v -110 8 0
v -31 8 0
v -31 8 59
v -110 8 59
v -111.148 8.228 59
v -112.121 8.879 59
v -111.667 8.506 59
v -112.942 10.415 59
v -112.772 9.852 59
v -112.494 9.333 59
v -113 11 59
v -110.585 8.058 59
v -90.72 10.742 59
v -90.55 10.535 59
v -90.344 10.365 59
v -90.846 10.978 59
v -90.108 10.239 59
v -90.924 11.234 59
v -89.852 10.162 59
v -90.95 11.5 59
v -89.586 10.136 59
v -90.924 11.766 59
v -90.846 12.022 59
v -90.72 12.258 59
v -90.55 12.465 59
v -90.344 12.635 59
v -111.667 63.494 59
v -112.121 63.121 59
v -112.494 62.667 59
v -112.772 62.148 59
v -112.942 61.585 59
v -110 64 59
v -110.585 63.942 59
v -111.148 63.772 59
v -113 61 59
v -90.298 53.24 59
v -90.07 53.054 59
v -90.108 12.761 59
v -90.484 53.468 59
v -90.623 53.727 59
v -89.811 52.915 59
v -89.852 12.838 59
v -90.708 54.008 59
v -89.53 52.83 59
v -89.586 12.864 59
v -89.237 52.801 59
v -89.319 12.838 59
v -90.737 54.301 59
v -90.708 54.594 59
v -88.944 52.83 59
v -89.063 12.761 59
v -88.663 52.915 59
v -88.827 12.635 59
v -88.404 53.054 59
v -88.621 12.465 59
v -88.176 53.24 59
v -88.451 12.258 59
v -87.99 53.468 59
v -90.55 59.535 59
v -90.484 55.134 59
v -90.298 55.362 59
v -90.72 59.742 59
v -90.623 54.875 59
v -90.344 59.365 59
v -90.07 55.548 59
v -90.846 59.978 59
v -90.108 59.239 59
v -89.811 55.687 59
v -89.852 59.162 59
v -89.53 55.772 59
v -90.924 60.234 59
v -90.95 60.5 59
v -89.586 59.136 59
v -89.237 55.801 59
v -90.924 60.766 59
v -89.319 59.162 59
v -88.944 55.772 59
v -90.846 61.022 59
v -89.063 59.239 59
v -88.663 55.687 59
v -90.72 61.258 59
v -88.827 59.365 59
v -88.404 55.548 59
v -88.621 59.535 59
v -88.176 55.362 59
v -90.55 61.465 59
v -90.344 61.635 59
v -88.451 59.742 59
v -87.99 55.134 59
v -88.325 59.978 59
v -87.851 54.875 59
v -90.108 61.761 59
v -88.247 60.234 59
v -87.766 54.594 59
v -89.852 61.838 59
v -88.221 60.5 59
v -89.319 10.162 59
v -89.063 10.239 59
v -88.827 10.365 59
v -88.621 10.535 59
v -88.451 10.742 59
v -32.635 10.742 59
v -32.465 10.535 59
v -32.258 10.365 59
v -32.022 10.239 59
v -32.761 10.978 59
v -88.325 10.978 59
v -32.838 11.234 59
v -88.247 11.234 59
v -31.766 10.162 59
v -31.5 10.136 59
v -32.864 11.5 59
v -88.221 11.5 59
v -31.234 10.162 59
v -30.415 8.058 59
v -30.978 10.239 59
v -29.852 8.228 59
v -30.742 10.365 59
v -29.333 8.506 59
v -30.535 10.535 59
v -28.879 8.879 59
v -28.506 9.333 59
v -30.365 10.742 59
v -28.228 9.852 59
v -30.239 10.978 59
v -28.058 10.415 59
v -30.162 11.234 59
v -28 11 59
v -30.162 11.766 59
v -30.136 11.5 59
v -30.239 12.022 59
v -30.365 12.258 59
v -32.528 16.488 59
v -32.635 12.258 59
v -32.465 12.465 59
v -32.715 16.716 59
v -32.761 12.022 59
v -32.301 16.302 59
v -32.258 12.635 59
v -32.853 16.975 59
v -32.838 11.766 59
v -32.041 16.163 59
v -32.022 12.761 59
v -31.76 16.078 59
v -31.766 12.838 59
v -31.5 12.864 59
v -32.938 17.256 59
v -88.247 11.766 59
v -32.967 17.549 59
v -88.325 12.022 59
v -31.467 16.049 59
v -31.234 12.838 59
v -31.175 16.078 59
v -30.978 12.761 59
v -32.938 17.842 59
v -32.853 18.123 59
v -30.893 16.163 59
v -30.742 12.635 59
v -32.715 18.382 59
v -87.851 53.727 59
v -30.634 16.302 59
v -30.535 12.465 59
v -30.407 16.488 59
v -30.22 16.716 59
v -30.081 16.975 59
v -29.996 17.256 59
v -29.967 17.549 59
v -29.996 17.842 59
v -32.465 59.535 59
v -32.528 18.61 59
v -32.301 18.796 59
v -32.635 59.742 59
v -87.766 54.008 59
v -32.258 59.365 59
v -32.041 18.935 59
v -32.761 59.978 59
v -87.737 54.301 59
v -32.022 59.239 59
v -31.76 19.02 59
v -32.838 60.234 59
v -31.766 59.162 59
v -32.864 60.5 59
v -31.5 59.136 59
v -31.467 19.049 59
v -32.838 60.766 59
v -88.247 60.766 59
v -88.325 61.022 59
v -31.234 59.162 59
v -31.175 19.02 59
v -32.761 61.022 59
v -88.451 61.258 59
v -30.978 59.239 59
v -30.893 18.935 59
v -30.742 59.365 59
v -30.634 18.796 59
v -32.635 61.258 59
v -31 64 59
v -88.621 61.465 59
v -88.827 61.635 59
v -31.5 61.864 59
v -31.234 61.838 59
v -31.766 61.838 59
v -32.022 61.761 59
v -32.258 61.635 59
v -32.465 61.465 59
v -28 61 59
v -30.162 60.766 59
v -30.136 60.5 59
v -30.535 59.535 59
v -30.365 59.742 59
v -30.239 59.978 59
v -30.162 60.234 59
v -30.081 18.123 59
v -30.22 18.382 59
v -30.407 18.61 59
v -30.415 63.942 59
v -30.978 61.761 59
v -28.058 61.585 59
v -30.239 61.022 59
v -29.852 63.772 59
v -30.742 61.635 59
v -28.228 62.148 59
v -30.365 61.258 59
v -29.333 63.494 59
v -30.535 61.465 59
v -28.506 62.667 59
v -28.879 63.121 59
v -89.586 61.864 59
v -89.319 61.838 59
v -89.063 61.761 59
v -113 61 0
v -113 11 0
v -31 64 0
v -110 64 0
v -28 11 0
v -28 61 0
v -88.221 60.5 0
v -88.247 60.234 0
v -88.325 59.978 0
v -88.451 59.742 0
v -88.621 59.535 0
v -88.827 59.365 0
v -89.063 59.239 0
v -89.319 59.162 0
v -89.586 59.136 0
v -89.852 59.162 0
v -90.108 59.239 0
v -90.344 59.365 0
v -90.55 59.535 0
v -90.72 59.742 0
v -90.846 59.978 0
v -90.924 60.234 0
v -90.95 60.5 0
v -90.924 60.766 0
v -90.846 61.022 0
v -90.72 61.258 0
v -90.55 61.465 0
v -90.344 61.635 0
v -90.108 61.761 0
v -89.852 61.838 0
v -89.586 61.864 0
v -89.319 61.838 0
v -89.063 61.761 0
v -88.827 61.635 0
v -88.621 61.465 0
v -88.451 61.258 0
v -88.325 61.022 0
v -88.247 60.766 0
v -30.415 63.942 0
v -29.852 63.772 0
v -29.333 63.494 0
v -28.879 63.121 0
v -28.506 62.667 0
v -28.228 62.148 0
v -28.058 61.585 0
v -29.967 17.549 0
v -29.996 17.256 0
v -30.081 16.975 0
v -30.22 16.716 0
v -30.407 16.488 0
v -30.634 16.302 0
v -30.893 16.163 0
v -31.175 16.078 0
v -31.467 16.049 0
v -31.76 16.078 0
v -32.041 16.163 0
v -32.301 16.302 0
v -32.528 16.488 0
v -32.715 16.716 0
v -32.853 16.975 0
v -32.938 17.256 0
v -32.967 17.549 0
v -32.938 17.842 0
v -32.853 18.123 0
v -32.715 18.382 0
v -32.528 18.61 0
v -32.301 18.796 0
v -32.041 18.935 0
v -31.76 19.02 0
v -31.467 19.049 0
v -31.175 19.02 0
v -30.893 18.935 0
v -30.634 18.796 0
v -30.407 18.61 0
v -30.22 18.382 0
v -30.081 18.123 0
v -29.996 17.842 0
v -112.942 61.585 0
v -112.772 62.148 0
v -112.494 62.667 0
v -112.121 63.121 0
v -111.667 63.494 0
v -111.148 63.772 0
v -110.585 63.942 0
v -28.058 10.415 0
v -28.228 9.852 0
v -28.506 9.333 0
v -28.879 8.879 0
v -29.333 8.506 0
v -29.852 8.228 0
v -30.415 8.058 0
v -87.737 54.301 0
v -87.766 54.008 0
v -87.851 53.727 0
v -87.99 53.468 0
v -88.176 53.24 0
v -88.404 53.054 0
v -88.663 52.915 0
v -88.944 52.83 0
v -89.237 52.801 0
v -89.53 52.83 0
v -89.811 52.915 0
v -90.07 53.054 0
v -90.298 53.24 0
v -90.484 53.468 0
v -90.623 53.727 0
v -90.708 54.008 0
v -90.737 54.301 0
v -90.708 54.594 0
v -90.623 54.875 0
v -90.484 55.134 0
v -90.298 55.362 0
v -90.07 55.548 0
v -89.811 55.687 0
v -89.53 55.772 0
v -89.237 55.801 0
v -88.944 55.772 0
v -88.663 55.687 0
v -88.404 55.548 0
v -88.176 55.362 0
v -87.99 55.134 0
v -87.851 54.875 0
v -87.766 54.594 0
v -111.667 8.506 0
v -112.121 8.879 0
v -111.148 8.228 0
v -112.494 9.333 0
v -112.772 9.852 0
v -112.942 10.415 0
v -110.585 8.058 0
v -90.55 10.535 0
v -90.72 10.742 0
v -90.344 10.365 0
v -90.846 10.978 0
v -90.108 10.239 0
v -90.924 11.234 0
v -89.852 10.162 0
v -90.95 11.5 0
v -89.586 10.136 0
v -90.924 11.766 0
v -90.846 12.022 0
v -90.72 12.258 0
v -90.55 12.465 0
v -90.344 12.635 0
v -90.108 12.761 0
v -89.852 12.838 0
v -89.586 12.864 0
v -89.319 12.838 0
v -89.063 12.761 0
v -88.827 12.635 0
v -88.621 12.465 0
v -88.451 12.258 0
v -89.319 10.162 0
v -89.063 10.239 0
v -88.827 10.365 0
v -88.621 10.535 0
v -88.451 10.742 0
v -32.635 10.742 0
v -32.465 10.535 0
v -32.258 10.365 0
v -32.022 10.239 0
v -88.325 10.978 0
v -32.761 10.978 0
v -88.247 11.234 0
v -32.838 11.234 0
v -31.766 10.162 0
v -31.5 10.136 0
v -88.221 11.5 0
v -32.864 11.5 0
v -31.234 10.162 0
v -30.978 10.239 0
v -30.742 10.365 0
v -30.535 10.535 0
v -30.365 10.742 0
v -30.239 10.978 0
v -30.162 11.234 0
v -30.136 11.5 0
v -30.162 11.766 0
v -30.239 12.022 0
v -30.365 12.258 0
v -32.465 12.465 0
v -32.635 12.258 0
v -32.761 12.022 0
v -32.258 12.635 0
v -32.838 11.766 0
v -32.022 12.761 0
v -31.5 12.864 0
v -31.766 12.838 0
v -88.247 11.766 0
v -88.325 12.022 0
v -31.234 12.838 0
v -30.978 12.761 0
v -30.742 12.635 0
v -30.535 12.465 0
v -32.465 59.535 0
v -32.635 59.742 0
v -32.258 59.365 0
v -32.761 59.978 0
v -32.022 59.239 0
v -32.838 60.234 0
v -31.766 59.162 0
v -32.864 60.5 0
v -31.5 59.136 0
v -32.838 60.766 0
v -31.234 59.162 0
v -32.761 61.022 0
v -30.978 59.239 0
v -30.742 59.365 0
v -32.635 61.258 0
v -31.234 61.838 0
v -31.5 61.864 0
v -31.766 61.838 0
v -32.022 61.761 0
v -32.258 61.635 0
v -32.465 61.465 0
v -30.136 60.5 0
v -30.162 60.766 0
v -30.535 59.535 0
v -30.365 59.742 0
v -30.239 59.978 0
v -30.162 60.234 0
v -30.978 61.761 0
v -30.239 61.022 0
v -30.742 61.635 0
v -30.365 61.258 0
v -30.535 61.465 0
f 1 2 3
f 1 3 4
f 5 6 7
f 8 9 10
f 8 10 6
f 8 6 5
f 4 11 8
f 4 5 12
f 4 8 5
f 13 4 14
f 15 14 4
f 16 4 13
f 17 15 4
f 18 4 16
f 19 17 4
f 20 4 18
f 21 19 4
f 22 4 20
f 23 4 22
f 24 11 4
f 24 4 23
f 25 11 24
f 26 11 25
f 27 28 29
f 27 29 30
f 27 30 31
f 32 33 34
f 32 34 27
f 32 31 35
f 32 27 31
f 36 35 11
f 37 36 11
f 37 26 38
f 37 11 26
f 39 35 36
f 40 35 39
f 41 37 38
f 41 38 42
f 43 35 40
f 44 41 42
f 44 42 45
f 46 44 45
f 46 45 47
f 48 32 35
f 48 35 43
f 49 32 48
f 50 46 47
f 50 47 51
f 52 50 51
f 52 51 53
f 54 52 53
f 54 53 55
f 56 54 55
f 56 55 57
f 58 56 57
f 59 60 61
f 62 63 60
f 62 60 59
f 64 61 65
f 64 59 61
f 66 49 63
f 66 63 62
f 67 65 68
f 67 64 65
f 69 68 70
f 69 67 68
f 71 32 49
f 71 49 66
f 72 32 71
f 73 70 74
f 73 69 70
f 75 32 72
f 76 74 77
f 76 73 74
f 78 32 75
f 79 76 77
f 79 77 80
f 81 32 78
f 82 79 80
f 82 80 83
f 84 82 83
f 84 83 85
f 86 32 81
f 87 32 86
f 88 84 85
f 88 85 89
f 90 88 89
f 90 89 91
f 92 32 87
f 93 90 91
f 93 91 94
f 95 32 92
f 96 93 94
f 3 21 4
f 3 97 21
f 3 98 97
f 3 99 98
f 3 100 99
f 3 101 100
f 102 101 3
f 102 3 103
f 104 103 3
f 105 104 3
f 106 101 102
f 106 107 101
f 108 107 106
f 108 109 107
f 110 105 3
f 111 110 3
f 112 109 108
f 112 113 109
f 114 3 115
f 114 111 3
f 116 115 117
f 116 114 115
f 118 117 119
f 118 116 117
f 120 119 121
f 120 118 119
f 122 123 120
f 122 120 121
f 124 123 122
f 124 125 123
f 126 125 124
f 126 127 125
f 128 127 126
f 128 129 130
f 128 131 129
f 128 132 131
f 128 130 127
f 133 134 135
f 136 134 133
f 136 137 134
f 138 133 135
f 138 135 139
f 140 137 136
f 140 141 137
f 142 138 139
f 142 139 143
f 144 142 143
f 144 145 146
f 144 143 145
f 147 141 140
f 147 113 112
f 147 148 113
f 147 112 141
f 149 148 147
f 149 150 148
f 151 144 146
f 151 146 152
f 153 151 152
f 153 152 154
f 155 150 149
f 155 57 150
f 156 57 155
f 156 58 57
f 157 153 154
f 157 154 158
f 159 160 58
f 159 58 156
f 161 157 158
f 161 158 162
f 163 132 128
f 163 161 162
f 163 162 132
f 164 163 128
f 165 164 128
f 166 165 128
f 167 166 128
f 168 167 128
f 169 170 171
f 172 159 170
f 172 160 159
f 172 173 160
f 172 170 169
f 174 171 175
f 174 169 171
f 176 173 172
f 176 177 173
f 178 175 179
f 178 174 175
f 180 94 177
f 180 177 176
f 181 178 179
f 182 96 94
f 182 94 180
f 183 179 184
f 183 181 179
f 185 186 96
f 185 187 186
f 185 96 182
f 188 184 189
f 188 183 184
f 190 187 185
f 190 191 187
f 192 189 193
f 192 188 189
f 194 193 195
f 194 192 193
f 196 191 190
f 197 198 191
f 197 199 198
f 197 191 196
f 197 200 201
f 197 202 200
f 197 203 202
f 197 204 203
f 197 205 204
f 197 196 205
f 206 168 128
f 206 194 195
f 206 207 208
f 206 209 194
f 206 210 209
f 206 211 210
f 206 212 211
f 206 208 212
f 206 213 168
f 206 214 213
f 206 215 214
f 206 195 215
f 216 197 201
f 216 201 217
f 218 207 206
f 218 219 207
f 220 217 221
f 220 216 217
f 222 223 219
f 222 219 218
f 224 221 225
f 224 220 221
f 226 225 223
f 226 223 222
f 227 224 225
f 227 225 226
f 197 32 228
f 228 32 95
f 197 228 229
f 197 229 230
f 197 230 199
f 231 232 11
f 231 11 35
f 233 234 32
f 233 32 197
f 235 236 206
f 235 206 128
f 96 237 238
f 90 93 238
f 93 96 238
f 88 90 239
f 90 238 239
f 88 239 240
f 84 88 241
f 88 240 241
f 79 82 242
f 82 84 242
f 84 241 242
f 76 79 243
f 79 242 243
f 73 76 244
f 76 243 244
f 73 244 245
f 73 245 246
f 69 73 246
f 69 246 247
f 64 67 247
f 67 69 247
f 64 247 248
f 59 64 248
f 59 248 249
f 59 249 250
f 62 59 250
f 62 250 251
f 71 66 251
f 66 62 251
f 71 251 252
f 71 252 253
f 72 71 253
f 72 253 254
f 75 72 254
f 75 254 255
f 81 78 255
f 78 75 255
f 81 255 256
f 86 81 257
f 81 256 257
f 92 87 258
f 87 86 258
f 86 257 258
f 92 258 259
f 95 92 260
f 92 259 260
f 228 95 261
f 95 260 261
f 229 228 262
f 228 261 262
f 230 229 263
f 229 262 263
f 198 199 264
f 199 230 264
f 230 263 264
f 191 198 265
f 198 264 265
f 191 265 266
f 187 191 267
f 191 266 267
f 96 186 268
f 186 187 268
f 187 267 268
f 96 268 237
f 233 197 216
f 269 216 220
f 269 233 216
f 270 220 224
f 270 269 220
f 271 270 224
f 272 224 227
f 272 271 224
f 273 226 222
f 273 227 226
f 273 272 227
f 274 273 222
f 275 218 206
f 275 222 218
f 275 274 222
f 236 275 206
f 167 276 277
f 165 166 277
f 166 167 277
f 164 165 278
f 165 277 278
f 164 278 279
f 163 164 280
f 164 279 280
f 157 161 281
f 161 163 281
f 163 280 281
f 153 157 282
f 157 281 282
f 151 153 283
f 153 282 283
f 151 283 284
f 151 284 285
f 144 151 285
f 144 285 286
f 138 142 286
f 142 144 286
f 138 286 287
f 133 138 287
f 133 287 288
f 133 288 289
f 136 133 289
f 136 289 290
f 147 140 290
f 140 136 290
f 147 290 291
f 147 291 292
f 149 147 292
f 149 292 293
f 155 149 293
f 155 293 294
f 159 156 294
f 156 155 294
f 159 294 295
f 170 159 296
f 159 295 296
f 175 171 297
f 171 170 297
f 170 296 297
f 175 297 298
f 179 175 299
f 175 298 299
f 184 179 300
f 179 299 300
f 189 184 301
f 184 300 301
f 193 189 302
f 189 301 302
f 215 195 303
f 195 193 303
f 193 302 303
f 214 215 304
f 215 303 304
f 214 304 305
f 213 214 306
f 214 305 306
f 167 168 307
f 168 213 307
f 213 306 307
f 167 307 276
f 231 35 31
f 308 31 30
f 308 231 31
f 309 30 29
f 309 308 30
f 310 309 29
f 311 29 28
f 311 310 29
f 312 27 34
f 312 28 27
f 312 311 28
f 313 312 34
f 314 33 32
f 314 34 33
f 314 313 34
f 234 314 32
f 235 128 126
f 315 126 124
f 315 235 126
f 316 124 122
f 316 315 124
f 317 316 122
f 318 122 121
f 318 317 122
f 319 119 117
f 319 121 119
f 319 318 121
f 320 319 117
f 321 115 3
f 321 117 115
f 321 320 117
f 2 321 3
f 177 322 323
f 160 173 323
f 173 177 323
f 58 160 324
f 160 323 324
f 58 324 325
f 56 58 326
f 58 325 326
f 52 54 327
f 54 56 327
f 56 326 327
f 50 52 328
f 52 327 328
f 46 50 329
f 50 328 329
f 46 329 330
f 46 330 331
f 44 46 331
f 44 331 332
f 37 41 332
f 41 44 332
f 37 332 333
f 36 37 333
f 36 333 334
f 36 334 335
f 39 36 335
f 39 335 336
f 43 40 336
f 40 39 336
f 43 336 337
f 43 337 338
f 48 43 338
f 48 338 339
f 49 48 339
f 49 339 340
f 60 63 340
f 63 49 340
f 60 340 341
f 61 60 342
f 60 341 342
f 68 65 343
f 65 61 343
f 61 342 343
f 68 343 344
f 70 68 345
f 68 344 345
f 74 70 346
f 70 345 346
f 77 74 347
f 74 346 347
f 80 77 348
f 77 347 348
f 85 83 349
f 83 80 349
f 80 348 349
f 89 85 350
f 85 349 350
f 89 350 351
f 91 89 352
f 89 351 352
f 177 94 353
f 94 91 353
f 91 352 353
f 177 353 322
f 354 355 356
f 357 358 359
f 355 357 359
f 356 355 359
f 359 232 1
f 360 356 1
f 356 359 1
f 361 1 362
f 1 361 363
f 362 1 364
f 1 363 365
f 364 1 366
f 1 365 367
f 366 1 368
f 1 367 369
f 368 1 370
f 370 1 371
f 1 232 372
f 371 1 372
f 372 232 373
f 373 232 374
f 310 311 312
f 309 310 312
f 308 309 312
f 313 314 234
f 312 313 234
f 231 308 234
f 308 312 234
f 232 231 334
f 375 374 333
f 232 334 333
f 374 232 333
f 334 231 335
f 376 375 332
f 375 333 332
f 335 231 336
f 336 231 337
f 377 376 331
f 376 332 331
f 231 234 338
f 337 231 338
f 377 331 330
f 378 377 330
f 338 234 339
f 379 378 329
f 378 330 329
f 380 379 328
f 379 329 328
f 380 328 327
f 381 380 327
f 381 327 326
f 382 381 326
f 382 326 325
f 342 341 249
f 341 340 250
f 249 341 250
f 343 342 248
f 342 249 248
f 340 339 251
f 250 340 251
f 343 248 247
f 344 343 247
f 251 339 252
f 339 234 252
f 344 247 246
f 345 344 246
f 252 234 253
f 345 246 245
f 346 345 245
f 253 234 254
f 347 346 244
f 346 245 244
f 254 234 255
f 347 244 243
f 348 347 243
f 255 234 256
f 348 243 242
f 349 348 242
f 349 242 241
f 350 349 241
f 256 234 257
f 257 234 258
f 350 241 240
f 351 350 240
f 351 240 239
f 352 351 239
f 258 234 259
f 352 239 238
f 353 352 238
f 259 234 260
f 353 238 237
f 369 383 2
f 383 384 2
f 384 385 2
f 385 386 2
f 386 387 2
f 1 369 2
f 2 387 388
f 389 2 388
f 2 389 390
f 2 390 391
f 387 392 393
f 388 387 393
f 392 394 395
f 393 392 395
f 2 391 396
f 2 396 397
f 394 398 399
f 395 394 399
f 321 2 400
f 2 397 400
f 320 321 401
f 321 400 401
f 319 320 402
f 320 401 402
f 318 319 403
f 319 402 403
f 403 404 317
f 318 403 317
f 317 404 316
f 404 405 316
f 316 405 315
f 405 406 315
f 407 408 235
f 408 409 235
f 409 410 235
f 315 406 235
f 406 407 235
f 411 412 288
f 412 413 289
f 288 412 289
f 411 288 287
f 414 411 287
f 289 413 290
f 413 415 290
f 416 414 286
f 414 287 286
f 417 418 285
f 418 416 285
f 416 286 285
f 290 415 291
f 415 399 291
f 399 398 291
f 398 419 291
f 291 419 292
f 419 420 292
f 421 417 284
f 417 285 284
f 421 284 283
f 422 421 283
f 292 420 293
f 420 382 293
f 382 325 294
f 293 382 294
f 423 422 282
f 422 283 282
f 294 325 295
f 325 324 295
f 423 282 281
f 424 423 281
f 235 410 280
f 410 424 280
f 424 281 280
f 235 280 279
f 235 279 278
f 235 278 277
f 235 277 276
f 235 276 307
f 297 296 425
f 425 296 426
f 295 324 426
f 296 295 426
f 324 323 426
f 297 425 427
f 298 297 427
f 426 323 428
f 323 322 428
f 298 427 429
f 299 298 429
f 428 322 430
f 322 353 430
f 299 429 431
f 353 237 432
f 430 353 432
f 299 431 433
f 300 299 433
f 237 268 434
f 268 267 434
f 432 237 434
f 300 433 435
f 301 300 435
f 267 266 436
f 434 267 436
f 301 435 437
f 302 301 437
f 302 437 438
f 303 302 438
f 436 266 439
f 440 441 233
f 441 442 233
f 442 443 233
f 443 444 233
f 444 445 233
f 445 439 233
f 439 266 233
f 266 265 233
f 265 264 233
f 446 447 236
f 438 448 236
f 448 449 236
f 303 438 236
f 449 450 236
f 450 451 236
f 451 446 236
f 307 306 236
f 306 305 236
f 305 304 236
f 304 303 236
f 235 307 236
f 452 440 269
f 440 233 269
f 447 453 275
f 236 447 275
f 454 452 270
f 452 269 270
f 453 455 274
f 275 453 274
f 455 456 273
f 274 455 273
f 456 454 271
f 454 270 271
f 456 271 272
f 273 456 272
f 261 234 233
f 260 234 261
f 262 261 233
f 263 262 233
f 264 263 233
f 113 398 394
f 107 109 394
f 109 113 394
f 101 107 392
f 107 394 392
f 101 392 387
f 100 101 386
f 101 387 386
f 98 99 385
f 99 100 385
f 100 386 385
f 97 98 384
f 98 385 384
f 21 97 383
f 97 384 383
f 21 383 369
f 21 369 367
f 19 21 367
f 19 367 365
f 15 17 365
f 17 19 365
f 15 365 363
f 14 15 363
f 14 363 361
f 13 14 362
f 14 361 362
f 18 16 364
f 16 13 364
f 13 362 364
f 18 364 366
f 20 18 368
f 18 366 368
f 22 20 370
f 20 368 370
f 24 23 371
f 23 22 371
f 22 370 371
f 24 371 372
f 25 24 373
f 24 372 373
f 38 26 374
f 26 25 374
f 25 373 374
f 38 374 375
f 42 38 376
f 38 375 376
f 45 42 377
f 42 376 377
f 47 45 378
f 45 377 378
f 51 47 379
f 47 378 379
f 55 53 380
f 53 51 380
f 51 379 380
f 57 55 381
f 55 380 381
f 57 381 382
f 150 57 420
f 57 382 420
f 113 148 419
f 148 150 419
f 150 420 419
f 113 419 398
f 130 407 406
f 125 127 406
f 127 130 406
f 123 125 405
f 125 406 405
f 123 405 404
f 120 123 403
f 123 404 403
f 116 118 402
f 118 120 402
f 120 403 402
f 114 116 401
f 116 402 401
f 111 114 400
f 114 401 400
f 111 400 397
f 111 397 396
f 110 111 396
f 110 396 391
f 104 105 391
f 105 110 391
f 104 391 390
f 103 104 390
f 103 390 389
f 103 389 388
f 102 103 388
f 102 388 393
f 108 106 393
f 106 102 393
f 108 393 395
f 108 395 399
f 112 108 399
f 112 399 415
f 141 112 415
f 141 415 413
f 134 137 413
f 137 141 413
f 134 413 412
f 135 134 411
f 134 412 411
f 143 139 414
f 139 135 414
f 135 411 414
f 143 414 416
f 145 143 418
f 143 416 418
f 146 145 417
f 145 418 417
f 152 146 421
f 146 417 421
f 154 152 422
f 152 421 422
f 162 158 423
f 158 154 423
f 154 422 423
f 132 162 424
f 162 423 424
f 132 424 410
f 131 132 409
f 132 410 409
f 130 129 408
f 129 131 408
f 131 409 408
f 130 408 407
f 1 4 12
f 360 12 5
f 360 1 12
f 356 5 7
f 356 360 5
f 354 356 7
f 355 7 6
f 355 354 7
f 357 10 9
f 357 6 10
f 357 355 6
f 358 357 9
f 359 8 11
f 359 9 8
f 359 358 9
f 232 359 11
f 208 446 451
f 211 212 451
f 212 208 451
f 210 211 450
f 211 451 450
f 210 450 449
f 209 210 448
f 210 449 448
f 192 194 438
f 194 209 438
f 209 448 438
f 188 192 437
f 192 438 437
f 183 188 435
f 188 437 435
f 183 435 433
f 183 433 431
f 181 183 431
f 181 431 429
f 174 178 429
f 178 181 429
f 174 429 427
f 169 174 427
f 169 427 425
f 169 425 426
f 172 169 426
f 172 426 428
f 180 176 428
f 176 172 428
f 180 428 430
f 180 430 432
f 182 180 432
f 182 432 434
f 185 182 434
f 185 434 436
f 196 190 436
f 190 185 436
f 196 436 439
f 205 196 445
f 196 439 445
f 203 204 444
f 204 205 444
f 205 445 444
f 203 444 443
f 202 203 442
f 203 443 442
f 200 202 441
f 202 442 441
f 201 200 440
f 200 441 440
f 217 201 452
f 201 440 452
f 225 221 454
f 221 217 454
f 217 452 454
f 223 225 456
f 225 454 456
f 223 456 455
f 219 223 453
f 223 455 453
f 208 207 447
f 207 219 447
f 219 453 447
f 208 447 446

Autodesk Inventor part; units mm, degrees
ref_plane "YZ Plane" through (0, 0, 0) normal (1, 0, 0) x (0, 1, 0)
ref_plane "XZ Plane" through (0, 0, 0) normal (0, 1, 0) x (-1, 0, 0)
ref_plane "XY Plane" through (0, 0, 0) normal (0, 0, 1) x (1, 0, 0)
sketch "Sketch1" plane through (0, 0, 0) normal (0, 0, 1) x (1, 0, 0)
  line L0 (-28, 61) -> (-28, 11) projected
  arc A0 (-28, 61) -> (-31, 64) centre (-31, 61) ccw projected
  line L1 (-110, 64) -> (-31, 64) projected
  arc A1 (-110, 64) -> (-113, 61) centre (-110, 61) ccw projected
  line L2 (-113, 11) -> (-113, 61) projected
  arc A2 (-113, 11) -> (-110, 8) centre (-110, 11) ccw projected
  line L3 (-31, 8) -> (-110, 8) projected
  arc A3 (-31, 8) -> (-28, 11) centre (-31, 11) ccw projected
  circle A4 centre (-89.5855, 11.5) radius 1.3645 projected
  circle A5 centre (-89.5855, 60.5) radius 1.3645 projected
  circle A6 centre (-31.5, 60.5) radius 1.3645 projected
  circle A7 centre (-31.5, 11.5) radius 1.3645 projected
  circle A8 centre (-31.4673, 17.5489) radius 1.5 projected
  circle A9 centre (-89.237, 54.3009) radius 1.5 projected
  point P0 (0, 0)
extrude "Extrusion1" add sketch "Sketch1" along normal blind 59
properties part number "UPSboard"
